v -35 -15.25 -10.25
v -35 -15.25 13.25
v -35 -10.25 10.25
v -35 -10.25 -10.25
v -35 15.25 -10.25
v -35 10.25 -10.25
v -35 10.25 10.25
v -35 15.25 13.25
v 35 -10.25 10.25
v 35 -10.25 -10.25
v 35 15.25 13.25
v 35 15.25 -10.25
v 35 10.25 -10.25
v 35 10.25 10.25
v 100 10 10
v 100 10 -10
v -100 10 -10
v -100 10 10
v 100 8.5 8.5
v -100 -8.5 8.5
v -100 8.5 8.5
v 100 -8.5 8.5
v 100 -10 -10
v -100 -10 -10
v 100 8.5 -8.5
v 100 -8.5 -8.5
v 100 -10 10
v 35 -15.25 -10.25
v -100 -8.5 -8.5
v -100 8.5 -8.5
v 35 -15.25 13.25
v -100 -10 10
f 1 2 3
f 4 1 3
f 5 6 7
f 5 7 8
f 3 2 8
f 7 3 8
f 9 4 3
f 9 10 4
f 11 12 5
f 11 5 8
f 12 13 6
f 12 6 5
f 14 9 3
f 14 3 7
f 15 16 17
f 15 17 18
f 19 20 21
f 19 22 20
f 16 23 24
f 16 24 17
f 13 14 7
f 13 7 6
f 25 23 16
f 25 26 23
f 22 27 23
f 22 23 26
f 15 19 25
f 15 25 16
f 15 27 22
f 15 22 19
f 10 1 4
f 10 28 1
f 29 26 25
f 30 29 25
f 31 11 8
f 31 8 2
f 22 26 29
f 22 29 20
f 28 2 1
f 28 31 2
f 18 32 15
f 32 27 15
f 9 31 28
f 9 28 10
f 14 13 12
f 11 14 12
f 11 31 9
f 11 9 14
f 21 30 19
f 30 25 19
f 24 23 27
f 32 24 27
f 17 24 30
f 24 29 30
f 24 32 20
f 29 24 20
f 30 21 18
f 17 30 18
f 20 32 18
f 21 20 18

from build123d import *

# Parameters (mm, degrees)
SKETCH_W     = 20
SKETCH_H     = 20
SKETCH_W_2   = 17
SKETCH_H_2   = 17
PAD_DEPTH    = 100
PAD001_DEPTH = 35


with BuildPart() as k_rper:
    # Sketch → Pad (new body, symmetric)
    with BuildSketch(Plane.YZ):
        Rectangle(SKETCH_W, SKETCH_H)
        Rectangle(SKETCH_W_2, SKETCH_H_2, mode=Mode.SUBTRACT)
    extrude(amount=PAD_DEPTH, both=True)


with BuildPart() as k_rper001:
    # Sketch001 → Pad001 (new body, symmetric)
    with BuildSketch(Plane.YZ):
        Polygon((-10.25, -10.25), (-10.25, 10.25), (10.25, 10.25), (10.25, -10.25), (15.25, -10.25), (15.25, 13.25), (-15.25, 13.25), (-15.25, -10.25), align=None)
    extrude(amount=PAD001_DEPTH, both=True)


solid = Compound([k_rper.part, k_rper001.part])
